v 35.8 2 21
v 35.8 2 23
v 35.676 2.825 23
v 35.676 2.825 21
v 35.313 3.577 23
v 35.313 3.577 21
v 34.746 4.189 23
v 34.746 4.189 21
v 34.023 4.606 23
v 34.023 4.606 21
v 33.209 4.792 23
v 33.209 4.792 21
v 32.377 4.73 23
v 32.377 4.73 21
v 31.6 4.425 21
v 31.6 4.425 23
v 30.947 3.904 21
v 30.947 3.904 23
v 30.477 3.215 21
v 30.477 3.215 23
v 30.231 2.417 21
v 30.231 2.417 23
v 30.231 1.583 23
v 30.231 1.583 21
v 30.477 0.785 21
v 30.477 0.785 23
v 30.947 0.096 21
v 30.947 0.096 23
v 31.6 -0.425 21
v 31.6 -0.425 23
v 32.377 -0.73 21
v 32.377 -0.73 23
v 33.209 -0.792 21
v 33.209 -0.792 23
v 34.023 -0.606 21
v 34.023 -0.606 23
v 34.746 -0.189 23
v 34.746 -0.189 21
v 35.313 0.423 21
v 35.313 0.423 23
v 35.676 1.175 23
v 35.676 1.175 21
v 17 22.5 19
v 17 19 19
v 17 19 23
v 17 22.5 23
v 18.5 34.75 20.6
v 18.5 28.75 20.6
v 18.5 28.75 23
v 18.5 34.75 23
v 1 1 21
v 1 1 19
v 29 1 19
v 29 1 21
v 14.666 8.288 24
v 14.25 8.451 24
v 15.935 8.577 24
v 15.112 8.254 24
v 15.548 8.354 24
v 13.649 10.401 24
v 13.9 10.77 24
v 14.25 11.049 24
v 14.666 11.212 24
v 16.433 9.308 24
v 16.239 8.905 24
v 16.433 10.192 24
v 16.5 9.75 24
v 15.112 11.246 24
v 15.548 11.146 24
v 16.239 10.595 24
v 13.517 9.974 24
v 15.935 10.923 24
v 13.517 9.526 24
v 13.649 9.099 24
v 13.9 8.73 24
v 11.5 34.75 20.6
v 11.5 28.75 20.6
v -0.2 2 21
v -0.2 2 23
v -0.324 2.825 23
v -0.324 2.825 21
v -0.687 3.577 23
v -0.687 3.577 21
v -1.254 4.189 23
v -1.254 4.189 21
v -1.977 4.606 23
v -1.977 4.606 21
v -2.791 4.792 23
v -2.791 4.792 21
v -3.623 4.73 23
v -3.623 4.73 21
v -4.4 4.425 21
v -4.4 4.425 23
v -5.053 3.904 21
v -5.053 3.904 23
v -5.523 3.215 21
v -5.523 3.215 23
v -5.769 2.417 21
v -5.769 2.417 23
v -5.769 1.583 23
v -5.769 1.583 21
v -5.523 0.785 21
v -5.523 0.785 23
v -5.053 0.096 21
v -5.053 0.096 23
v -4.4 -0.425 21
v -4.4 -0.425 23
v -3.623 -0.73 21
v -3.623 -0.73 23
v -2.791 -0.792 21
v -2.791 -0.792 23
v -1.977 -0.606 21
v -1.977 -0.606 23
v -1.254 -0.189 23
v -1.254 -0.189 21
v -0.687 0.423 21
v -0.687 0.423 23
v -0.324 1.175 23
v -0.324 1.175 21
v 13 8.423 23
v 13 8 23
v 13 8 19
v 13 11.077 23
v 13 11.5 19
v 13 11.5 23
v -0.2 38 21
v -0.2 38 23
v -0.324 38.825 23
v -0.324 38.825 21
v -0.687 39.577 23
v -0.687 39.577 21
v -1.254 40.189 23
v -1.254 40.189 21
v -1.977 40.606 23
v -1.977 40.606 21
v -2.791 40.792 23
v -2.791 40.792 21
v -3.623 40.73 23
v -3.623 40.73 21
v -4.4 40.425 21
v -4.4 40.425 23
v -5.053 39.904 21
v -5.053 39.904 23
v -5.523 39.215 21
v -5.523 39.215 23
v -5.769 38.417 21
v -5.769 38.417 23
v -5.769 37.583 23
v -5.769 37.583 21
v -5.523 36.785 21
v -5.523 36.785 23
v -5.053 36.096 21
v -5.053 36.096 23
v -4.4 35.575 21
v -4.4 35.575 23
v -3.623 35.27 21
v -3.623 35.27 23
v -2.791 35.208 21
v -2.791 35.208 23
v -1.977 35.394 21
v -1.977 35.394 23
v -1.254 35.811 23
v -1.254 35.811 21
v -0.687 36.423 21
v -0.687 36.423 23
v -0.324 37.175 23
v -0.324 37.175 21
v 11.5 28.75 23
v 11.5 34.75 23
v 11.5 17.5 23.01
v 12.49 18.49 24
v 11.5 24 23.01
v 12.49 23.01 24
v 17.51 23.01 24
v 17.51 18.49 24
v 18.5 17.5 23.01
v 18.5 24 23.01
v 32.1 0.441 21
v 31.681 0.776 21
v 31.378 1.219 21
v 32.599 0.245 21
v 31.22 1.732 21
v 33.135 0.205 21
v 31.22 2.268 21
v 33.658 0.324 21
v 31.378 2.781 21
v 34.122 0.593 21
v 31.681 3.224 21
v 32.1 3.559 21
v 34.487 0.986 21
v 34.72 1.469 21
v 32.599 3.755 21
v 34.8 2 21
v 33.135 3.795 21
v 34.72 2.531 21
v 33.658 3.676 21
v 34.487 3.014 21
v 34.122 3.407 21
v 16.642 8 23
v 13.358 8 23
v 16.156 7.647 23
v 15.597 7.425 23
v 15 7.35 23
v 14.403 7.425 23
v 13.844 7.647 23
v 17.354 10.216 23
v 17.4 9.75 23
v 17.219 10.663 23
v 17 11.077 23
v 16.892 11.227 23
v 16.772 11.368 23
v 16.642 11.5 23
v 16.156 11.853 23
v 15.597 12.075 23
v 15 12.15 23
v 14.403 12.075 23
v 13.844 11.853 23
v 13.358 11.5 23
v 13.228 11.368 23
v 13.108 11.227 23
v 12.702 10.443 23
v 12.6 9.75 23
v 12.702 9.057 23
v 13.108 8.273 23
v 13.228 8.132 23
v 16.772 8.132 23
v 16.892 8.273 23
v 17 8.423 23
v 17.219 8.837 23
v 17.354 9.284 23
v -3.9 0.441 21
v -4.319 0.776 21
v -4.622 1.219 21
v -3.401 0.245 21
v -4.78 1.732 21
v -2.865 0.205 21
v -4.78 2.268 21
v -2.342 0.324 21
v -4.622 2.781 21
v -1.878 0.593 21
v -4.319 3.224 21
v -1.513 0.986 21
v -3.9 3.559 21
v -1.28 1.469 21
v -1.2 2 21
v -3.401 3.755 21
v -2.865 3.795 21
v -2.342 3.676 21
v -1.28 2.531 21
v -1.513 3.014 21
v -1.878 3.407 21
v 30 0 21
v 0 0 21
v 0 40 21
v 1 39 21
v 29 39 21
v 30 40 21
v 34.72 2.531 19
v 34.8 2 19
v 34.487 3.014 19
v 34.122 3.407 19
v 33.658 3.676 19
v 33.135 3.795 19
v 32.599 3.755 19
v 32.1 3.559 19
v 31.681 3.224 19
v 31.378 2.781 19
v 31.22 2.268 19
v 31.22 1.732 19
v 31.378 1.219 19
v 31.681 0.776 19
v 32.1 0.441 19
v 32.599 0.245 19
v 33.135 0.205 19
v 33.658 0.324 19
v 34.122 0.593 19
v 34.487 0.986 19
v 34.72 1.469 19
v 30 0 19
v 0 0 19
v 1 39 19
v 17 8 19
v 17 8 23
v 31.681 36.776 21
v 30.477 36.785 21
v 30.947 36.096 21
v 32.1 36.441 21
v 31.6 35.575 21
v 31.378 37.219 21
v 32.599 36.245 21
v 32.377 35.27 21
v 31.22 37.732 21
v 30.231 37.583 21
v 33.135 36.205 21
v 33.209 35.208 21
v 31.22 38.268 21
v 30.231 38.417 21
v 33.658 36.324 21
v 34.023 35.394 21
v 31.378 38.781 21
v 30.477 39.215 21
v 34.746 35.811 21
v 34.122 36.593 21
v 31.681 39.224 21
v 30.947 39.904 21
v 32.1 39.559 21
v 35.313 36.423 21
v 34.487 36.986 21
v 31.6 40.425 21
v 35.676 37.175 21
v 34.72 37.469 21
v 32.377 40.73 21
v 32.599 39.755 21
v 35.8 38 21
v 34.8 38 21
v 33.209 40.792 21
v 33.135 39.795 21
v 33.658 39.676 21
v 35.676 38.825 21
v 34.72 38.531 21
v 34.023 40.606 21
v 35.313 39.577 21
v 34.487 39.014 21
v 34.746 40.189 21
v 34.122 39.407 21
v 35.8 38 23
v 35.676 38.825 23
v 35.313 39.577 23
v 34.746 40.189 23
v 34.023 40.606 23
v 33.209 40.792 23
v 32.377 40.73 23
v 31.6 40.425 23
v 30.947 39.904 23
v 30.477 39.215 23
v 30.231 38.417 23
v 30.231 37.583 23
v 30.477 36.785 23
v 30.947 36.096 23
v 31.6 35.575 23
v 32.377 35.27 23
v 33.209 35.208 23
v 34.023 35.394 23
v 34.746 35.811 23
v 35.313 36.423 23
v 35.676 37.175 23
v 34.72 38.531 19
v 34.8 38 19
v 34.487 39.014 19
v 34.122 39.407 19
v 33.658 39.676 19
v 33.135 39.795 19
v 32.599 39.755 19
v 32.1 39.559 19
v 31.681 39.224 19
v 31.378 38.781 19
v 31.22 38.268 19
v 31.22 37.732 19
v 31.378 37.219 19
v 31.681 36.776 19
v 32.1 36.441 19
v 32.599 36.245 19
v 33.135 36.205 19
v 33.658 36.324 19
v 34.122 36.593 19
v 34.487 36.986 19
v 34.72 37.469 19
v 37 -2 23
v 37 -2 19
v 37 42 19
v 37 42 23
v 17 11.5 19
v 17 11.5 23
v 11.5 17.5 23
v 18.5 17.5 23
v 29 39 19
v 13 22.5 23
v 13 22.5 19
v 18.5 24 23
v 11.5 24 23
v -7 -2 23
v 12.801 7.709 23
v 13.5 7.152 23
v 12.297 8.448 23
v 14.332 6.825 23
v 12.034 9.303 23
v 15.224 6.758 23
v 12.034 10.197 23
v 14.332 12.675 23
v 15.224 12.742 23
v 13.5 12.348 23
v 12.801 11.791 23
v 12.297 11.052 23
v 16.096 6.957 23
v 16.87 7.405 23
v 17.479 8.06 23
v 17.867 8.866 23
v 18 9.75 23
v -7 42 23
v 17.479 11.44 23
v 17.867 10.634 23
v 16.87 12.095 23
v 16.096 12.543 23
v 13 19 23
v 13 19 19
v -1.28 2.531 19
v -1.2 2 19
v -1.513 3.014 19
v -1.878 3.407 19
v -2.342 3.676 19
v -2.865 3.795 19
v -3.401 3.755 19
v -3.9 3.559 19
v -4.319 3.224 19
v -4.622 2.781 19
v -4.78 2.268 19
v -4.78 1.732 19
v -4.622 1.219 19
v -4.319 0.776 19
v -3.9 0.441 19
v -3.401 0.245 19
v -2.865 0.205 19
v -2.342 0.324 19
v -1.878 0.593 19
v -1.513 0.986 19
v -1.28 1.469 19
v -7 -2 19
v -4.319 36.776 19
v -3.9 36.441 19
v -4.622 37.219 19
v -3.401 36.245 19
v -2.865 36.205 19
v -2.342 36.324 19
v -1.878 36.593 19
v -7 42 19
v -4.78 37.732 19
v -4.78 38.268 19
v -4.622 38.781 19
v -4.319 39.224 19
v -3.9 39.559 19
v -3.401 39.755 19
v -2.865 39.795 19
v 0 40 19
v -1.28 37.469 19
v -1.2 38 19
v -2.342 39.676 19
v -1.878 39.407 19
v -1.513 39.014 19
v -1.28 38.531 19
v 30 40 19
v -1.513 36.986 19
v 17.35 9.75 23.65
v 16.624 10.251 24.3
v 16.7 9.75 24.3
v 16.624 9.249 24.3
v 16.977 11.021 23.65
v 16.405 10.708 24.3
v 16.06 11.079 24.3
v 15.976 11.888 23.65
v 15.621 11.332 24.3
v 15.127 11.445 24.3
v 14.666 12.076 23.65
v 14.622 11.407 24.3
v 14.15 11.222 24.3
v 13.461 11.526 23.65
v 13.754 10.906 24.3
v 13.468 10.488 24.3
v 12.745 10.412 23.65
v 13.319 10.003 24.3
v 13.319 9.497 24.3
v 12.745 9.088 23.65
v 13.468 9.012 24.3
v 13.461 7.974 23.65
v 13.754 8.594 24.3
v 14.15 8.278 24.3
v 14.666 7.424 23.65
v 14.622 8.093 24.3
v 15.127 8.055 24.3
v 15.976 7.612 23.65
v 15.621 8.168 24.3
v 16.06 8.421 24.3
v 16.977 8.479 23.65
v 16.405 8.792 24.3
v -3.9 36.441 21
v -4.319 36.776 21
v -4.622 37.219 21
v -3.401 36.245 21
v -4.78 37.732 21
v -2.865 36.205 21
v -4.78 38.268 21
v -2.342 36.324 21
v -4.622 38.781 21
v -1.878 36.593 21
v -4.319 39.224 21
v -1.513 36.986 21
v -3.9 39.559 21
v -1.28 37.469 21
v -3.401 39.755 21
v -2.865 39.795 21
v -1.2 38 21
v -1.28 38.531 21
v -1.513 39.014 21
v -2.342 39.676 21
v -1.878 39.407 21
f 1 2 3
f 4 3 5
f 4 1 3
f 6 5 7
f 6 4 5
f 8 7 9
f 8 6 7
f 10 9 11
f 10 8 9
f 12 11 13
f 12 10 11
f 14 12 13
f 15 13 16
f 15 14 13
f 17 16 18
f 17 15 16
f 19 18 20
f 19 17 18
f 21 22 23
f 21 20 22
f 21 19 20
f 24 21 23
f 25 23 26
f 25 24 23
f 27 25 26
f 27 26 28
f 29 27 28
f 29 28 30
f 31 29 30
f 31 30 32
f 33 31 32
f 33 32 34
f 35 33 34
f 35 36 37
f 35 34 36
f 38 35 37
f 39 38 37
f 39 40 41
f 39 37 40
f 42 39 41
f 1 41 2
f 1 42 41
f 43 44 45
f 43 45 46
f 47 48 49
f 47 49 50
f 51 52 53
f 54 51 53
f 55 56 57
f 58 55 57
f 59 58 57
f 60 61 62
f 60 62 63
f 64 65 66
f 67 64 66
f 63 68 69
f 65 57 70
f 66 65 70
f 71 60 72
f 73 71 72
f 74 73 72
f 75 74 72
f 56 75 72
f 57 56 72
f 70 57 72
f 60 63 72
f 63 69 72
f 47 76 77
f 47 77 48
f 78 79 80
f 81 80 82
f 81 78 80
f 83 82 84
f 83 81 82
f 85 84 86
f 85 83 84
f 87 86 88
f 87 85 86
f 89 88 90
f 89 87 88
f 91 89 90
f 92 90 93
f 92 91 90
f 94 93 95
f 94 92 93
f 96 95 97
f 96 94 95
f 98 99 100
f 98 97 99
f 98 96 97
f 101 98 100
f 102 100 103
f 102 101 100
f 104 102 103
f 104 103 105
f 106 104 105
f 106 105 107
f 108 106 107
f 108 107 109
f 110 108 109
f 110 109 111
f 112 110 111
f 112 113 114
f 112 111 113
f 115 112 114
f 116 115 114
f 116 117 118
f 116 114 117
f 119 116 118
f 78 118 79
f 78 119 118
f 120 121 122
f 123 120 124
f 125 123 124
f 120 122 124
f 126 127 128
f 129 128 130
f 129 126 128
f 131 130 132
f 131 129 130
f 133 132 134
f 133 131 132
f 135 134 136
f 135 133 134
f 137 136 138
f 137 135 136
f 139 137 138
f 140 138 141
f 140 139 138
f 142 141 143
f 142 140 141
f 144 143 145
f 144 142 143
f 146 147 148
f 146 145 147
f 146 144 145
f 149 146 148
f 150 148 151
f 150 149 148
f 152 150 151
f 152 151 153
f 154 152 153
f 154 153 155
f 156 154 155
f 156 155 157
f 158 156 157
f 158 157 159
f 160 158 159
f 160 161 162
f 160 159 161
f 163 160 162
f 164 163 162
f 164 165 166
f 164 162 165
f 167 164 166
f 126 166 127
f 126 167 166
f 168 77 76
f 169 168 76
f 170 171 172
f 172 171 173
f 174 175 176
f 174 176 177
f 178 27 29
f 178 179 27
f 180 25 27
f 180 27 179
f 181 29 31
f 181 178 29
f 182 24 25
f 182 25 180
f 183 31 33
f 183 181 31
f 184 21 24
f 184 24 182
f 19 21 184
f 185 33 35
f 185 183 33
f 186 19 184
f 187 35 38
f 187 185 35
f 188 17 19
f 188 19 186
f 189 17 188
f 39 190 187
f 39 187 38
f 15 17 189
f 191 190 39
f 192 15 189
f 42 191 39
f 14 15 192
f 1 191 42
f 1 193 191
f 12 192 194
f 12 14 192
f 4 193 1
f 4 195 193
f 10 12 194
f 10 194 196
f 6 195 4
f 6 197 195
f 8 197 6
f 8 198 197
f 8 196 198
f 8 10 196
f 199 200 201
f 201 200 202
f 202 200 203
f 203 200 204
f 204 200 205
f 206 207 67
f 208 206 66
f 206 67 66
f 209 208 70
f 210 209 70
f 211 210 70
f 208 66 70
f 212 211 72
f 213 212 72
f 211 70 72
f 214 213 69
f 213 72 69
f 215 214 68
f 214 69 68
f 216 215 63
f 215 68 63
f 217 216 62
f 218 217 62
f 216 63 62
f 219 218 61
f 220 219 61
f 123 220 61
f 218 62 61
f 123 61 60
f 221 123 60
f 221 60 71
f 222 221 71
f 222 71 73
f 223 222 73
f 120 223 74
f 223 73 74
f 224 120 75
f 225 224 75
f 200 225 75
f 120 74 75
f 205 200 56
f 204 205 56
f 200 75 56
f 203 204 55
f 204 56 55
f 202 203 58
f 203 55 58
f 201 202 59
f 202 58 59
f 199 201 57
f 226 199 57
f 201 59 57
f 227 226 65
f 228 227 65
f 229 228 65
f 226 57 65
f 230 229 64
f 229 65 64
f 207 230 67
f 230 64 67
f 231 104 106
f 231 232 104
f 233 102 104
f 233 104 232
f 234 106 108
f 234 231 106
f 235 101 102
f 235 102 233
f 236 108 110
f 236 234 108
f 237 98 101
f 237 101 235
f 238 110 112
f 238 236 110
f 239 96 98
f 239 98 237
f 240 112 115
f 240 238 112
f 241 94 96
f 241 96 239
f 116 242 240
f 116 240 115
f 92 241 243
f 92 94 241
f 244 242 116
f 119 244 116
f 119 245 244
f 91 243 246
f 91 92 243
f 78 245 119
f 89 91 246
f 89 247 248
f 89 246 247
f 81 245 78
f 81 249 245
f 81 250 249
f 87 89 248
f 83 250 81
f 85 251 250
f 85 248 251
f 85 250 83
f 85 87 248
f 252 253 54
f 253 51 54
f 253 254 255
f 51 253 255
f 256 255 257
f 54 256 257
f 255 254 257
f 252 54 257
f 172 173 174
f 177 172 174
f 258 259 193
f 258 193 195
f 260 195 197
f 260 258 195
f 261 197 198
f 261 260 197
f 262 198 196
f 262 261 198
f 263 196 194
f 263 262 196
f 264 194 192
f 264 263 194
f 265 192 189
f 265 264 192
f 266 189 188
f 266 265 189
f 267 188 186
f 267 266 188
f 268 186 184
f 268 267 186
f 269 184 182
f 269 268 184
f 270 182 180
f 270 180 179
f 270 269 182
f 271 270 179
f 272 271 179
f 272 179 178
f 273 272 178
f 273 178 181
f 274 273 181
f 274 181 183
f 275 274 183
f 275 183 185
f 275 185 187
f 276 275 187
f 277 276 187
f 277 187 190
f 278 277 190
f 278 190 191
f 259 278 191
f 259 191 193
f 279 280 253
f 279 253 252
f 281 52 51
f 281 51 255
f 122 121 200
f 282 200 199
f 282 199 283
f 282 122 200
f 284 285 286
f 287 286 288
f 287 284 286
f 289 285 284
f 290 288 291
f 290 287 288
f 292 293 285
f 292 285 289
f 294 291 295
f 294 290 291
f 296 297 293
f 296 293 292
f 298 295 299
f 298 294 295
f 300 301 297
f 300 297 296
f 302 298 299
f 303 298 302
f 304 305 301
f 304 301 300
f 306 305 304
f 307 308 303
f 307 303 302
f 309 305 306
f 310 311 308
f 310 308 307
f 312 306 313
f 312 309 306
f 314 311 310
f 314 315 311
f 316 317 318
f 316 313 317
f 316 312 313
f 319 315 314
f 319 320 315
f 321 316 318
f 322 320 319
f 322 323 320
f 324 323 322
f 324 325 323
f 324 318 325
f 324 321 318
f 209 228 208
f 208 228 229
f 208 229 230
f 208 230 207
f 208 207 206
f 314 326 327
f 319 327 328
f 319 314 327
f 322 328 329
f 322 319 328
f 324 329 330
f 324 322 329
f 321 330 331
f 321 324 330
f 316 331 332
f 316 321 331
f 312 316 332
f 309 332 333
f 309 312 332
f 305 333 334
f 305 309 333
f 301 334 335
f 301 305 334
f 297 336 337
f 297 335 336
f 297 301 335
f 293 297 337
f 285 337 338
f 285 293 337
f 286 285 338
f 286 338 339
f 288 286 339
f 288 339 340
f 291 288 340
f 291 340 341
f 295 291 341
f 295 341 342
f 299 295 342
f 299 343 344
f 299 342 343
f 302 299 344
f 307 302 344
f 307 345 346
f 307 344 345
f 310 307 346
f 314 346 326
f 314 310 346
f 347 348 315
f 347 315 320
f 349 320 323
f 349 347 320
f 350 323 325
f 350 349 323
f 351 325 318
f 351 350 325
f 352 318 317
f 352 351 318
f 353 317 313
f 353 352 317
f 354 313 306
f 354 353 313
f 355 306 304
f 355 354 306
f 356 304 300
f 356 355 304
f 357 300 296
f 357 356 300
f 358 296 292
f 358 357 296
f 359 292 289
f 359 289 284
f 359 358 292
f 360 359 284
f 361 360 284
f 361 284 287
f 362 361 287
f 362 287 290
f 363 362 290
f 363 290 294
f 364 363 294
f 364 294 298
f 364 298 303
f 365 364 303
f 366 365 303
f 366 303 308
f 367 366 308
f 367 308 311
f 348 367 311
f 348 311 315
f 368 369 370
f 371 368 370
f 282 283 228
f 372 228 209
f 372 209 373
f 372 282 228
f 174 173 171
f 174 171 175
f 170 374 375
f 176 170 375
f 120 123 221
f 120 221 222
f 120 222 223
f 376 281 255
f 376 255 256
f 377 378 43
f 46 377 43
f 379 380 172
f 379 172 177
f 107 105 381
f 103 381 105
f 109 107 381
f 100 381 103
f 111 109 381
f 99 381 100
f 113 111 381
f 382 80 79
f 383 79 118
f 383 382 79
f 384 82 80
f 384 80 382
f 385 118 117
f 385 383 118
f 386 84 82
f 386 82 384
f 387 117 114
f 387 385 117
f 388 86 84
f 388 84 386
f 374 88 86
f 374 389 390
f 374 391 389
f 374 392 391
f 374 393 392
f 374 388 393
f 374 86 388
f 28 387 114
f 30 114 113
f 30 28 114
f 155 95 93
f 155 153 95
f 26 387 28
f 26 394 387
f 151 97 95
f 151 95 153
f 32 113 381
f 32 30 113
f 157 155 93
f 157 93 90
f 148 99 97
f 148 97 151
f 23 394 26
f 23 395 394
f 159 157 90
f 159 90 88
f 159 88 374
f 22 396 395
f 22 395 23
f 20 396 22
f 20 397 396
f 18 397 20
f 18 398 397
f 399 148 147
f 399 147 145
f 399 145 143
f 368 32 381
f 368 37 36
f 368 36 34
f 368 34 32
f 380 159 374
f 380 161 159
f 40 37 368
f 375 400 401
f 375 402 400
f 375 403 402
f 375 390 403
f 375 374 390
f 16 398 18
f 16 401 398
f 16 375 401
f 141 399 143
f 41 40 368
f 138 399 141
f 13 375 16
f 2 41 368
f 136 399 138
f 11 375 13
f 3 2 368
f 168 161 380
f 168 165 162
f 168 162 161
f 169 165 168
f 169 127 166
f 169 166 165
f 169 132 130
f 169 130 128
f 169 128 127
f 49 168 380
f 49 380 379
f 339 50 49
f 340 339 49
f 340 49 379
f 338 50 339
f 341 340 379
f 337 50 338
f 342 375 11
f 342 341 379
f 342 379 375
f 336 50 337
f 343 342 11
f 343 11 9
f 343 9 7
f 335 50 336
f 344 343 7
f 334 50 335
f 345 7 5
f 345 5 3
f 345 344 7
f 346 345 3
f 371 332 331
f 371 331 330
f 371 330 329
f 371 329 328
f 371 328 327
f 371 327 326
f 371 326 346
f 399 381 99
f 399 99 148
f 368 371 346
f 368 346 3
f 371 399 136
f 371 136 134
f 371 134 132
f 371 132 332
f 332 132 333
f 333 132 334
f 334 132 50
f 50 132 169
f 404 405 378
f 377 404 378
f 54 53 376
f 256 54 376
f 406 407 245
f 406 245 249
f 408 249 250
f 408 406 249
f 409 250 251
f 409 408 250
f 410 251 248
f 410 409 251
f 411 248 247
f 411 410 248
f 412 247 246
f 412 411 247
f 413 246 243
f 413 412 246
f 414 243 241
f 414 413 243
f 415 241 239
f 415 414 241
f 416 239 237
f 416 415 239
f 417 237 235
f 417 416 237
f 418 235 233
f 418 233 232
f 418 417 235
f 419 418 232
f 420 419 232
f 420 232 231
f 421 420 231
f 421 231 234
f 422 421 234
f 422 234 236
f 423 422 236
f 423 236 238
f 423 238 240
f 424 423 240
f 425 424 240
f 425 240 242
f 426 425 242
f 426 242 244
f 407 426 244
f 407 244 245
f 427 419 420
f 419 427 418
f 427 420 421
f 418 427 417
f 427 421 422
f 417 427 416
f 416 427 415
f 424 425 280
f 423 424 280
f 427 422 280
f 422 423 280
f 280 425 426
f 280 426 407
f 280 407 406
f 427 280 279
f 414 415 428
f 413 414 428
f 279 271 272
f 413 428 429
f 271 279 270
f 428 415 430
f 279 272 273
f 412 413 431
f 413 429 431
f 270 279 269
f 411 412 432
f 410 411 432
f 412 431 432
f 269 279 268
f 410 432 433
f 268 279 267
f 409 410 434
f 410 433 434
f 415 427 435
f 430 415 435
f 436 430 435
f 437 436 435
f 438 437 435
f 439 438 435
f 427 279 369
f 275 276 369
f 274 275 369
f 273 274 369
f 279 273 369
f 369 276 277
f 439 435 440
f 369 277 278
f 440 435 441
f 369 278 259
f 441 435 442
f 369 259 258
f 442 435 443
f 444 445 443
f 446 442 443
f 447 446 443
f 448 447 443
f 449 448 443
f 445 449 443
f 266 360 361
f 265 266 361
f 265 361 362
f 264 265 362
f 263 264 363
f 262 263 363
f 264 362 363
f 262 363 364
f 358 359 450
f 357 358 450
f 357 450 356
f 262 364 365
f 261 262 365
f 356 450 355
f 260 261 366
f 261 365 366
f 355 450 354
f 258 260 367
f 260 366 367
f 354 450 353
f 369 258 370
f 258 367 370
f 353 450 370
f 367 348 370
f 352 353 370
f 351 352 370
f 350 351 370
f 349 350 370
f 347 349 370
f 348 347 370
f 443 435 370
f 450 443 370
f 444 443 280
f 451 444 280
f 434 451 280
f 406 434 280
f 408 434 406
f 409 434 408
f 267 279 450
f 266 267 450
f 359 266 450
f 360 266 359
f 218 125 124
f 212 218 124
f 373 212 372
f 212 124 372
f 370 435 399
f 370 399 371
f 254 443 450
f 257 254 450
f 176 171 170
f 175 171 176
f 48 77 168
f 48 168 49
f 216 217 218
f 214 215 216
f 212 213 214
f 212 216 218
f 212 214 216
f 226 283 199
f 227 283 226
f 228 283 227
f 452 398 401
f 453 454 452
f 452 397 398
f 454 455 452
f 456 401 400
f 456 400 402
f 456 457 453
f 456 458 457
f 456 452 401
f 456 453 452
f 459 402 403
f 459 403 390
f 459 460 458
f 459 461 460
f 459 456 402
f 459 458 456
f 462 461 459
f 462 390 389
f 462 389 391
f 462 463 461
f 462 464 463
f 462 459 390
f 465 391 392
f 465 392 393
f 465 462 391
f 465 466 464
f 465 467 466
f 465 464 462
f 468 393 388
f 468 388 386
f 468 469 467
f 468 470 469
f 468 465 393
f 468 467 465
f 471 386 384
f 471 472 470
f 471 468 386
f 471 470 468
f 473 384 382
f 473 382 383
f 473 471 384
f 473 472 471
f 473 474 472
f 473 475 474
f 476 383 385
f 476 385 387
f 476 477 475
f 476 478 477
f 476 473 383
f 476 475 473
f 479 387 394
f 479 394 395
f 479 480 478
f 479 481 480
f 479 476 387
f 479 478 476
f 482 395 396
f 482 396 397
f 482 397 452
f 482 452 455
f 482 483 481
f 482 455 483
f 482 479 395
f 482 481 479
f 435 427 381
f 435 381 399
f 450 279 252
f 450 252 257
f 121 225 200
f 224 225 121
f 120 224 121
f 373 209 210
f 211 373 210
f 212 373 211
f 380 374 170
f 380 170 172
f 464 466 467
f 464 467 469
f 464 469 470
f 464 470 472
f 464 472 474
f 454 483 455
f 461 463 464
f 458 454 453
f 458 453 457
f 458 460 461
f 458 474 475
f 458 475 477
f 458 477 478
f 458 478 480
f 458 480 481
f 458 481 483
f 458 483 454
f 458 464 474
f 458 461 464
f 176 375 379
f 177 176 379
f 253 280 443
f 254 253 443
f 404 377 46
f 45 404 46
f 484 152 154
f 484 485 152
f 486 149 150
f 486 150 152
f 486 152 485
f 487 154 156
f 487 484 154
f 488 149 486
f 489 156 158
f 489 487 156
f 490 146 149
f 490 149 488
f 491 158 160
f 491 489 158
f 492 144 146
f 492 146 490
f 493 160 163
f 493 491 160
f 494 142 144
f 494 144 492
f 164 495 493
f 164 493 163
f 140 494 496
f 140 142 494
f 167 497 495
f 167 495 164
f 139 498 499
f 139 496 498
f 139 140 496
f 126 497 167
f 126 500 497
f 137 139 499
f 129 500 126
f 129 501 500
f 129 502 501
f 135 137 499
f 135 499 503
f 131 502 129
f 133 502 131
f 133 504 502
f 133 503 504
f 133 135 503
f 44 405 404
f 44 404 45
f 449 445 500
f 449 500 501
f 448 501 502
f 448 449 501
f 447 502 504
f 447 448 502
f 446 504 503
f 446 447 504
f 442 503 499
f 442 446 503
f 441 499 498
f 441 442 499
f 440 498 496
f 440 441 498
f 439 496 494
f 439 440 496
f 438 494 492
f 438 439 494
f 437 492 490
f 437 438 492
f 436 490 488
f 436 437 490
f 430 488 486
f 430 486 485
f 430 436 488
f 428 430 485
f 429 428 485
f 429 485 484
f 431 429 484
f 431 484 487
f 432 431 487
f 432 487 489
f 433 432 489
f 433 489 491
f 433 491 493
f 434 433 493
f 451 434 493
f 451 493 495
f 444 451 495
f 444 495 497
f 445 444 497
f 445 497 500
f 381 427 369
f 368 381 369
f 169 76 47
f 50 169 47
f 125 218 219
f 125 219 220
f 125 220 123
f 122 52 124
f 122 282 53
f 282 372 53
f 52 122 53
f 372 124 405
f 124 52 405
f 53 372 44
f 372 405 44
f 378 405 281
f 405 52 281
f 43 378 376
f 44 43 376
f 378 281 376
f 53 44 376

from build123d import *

# Parameters (mm, degrees)
BOX069_W          = 4
BOX069_H          = 3.5
BOX069_DEPTH      = 4
BOX065_W          = 7
BOX065_H          = 6.5
BOX065_DEPTH      = 3
CHAMFER_SIZE      = 0.99
BOX074_W          = 7
BOX074_H          = 6
BOX074_DEPTH      = 3
SKETCH001_W       = 30
SKETCH001_H       = 40
SKETCH001_W_2     = 28
SKETCH001_H_2     = 38
PAD001_DEPTH      = 2
CYLINDER015_R     = 2.8
CYLINDER015_DEPTH = 3
CYLINDER014_R     = 2.8
CYLINDER014_DEPTH = 3
CYLINDER013_R     = 2.8
CYLINDER013_DEPTH = 3
CYLINDER016_R     = 2.8
CYLINDER016_DEPTH = 3
BOX014_W          = 4
BOX014_H          = 3.5
BOX014_DEPTH      = 4
BOX015_W          = 4
BOX015_H          = 3.5
BOX015_DEPTH      = 4
CYLINDER010_R     = 1.8
CYLINDER010_DEPTH = 6
CYLINDER011_R     = 1.8
CYLINDER011_DEPTH = 6
CYLINDER012_R     = 1.8
CYLINDER012_DEPTH = 6
CYLINDER009_R     = 1.8
CYLINDER009_DEPTH = 6
BOX042_W          = 44
BOX042_H          = 44
BOX042_DEPTH      = 4


with BuildPart() as button2_box0002:
    # Box069 → Box069 (new body)
    with BuildSketch(Plane(origin=(13, 19, 19), x_dir=(1, 0, 0), z_dir=(0, 0, 1))):
        with Locations((2, 1.75)):
            Rectangle(BOX069_W, BOX069_H)
    extrude(amount=BOX069_DEPTH)


with BuildPart() as cut006:
    # Box065 → Box065 (new body)
    with BuildSketch(Plane(origin=(11.5, 17.5, 21), x_dir=(1, 0, 0), z_dir=(0, 0, 1))):
        with Locations((3.5, 3.25)):
            Rectangle(BOX065_W, BOX065_H)
    extrude(amount=BOX065_DEPTH)

    # Chamfer
    chamfer_edges = [cut006.edges().sort_by_distance(p)[0] for p in [
        (11.5, 20.75, 24),
        (18.5, 20.75, 24),
        (15, 17.5, 24),
        (15, 24, 24),
    ]]
    chamfer(chamfer_edges, length=CHAMFER_SIZE)

    # Cut006: cut Button2_box0002
    add(button2_box0002.part, mode=Mode.SUBTRACT)


with BuildPart() as cone001:
    # Cone001 → Cone001 (revolve)
    with BuildSketch(Plane(origin=(15, 9.75, 21), x_dir=(1, 0, 0), z_dir=(0, -1, 0))):
        Polygon((0, 0), (2.4, 0), (1.5, 1), (0, 1), align=None)
    revolve(axis=Axis((15, 9.75, 21), (0, 0, 1)))


with BuildPart() as button_top_cover001:
    # Cone → Cone (revolve)
    with BuildSketch(Plane(origin=(15, 9.75, 21), x_dir=(1, 0, 0), z_dir=(0, -1, 0))):
        Polygon((0, 0), (3, 0), (1.7, 1.3), (0, 1.3), align=None)
    revolve(axis=Axis((15, 9.75, 21), (0, 0, 1)))

    # Cut003: cut Cone001
    add(cone001.part, mode=Mode.SUBTRACT)


with BuildPart() as button_top_cover001_1:
    # Cut003 placement: moved
    add(button_top_cover001.part.moved(Location((0, 0, 2))))


with BuildPart() as box074:
    # Box074 → Box074 (new body)
    with BuildSketch(Plane(origin=(11.5, 28.75, 20.6), x_dir=(1, 0, 0), z_dir=(0, 0, 1))):
        with Locations((3.5, 3)):
            Rectangle(BOX074_W, BOX074_H)
    extrude(amount=BOX074_DEPTH)


with BuildPart() as gasket_cut:
    # Sketch001 → Pad001 (new body)
    with BuildSketch(Plane(origin=(2, 2, 19), x_dir=(1, 0, 0), z_dir=(0, 0, 1))):
        with Locations((13, 18)):
            Rectangle(SKETCH001_W, SKETCH001_H)
        with Locations((13, 18)):
            Rectangle(SKETCH001_W_2, SKETCH001_H_2, mode=Mode.SUBTRACT)
    extrude(amount=PAD001_DEPTH)


with BuildPart() as screw_head003:
    # Cylinder015 → Cylinder015 (new body)
    with BuildSketch(Plane(origin=(33, 38, 21), x_dir=(1, 0, 0), z_dir=(0, 0, 1))):
        Circle(CYLINDER015_R)
    extrude(amount=CYLINDER015_DEPTH)


with BuildPart() as screw_head002:
    # Cylinder014 → Cylinder014 (new body)
    with BuildSketch(Plane(origin=(-3, 38, 21), x_dir=(1, 0, 0), z_dir=(0, 0, 1))):
        Circle(CYLINDER014_R)
    extrude(amount=CYLINDER014_DEPTH)


with BuildPart() as screw_head001:
    # Cylinder013 → Cylinder013 (new body)
    with BuildSketch(Plane(origin=(-3, 2, 21), x_dir=(1, 0, 0), z_dir=(0, 0, 1))):
        Circle(CYLINDER013_R)
    extrude(amount=CYLINDER013_DEPTH)


with BuildPart() as screw_head_cut:
    # Cylinder016 → Cylinder016 (new body)
    with BuildSketch(Plane(origin=(33, 2, 21), x_dir=(1, 0, 0), z_dir=(0, 0, 1))):
        Circle(CYLINDER016_R)
    extrude(amount=CYLINDER016_DEPTH)

    # Fusion019: union Screw_head003, Screw_head002, Screw_head001
    add(screw_head003.part)
    add(screw_head002.part)
    add(screw_head001.part)


with BuildPart() as button1_box0001:
    # Box014 → Box014 (new body)
    with BuildSketch(Plane(origin=(13, 8, 19), x_dir=(1, 0, 0), z_dir=(0, 0, 1))):
        with Locations((2, 1.75)):
            Rectangle(BOX014_W, BOX014_H)
    extrude(amount=BOX014_DEPTH)


with BuildPart() as fusion004_cut:
    # Box015 → Box015 (new body)
    with BuildSketch(Plane(origin=(13, 19, 19), x_dir=(1, 0, 0), z_dir=(0, 0, 1))):
        with Locations((2, 1.75)):
            Rectangle(BOX015_W, BOX015_H)
    extrude(amount=BOX015_DEPTH)

    # Fusion004: union Button1_box0001
    add(button1_box0001.part)


with BuildPart() as mh_cut006:
    # Cylinder010 → Cylinder010 (new body)
    with BuildSketch(Plane(origin=(-3, 38, 15), x_dir=(1, 0, 0), z_dir=(0, 0, 1))):
        Circle(CYLINDER010_R)
    extrude(amount=CYLINDER010_DEPTH)


with BuildPart() as mh_cut007:
    # Cylinder011 → Cylinder011 (new body)
    with BuildSketch(Plane(origin=(33, 2, 15), x_dir=(1, 0, 0), z_dir=(0, 0, 1))):
        Circle(CYLINDER011_R)
    extrude(amount=CYLINDER011_DEPTH)


with BuildPart() as mh_cut008:
    # Cylinder012 → Cylinder012 (new body)
    with BuildSketch(Plane(origin=(33, 38, 15), x_dir=(1, 0, 0), z_dir=(0, 0, 1))):
        Circle(CYLINDER012_R)
    extrude(amount=CYLINDER012_DEPTH)


with BuildPart() as top_cut:
    # Cylinder009 → Cylinder009 (new body)
    with BuildSketch(Plane(origin=(-3, 2, 15), x_dir=(1, 0, 0), z_dir=(0, 0, 1))):
        Circle(CYLINDER009_R)
    extrude(amount=CYLINDER009_DEPTH)

    # Fusion018: union MH_Cut006, MH_Cut007, MH_Cut008
    add(mh_cut006.part)
    add(mh_cut007.part)
    add(mh_cut008.part)

    # Fusion020: union Gasket_cut, Screw_Head_cut, Fusion004_cut
    add(gasket_cut.part)
    add(screw_head_cut.part)
    add(fusion004_cut.part)


with BuildPart() as top_final:
    # Box042 → Box042 (new body)
    with BuildSketch(Plane(origin=(-7, -2, 19), x_dir=(1, 0, 0), z_dir=(0, 0, 1))):
        with Locations((22, 22)):
            Rectangle(BOX042_W, BOX042_H)
    extrude(amount=BOX042_DEPTH)

    # Cut004: cut top_cut
    add(top_cut.part, mode=Mode.SUBTRACT)

    # Cut010: cut Box074
    add(box074.part, mode=Mode.SUBTRACT)

    # Fusion025: union Cut006, Button_Top_cover001
    add(cut006.part)
    add(button_top_cover001_1.part)


solid = top_final.part
